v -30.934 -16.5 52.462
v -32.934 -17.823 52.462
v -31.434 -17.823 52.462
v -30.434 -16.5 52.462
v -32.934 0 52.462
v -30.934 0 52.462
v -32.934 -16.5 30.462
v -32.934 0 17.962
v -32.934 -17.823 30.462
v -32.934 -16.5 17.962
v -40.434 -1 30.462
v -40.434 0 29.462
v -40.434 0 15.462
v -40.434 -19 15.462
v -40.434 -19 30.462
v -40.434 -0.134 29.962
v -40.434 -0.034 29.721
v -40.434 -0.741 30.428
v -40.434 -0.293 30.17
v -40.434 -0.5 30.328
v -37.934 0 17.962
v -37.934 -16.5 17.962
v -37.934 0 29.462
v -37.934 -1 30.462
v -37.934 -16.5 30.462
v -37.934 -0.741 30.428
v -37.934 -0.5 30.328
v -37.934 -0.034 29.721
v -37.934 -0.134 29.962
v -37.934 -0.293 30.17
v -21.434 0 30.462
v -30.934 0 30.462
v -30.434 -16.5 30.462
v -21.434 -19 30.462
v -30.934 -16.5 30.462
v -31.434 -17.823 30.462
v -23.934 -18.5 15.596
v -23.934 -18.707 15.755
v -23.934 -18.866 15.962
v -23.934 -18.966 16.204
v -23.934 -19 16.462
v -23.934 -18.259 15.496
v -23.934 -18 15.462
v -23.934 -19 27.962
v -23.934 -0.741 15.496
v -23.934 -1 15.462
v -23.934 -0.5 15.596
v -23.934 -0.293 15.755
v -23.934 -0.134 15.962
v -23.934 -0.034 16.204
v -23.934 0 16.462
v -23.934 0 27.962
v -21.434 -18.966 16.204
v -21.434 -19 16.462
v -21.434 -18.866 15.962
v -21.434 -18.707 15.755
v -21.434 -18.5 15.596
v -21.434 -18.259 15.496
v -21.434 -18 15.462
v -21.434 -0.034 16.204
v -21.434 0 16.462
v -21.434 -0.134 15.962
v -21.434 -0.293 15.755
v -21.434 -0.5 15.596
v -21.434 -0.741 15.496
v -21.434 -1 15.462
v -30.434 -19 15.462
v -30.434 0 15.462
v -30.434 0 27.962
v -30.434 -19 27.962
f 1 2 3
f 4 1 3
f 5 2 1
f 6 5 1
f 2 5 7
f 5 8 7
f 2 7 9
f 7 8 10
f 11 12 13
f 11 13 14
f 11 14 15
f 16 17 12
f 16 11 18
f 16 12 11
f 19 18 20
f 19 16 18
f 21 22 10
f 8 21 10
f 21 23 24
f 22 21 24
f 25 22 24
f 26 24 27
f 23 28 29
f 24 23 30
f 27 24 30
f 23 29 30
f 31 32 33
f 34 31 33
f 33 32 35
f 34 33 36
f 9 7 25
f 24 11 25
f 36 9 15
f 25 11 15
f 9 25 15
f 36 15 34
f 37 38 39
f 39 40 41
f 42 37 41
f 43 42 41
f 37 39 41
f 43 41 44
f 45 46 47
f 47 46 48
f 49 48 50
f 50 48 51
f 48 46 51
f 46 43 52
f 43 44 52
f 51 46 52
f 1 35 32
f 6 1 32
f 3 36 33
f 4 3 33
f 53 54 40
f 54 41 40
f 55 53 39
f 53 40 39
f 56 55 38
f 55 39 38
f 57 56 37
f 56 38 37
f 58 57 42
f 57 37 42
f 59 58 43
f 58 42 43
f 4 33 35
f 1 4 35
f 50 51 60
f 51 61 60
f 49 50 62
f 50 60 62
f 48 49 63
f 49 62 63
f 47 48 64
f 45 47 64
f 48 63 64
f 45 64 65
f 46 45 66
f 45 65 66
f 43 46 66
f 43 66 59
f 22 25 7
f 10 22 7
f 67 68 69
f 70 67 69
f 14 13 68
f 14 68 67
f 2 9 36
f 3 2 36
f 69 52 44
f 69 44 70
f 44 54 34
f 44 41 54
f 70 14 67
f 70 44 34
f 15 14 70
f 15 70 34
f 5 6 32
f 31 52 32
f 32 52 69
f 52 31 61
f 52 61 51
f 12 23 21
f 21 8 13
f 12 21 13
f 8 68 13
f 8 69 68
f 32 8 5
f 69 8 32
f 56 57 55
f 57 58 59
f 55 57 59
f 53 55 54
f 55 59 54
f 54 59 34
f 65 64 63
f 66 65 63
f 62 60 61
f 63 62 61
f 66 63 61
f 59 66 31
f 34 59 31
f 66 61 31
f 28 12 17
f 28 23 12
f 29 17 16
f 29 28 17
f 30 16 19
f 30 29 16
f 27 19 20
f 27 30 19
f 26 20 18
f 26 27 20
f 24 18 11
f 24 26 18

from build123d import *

# Parameters (mm, degrees)
F0_W     = 10
F0_H     = 15
F1_DEPTH = 19
F2_T     = -2.5
F3_DEPTH = 9
F4_T     = -2.5
F5_DEPTH = 25
F6_DEPTH = 25
F8_DEPTH = 22
F9_R     = 1


# Not quite as in the source:
# - two fillets or chamfers of one size are made in one step


with BuildPart() as f1:
    # F0 (on Front) → F1 (new body)
    with BuildSketch(Plane.XZ):
        with Locations((-35.433777729, 22.9624143615)):
            Rectangle(F0_W, F0_H)
    extrude(amount=F1_DEPTH)

    # F2
    f2_openings = [f1.faces().sort_by_distance(p)[0] for p in [
        (-35.433778, 0, 22.962414),
        (-35.433778, -9.5, 30.462414),
    ]]
    offset(amount=F2_T, openings=f2_openings)

    # F3 (add): a face of the model
    f3_faces = [f1.faces().sort_by_distance(p)[0] for p in [
        (-30.433777729, -9.5, 22.9624143615),
    ]]
    extrude(f3_faces, amount=F3_DEPTH)

    # F4: a shell. OpenCascade refuses it in one call, so the cavity is built on its own and cut out:
    # the body offset inwards by the wall thickness, plus a prism from it out through each open face.
    f4_core = offset(f1.part, amount=F4_T, kind=Kind.INTERSECTION, mode=Mode.PRIVATE)
    f4_exits = [f4_core.faces().sort_by_distance(p)[0] for p in [
        (-27.183778, -2.5, 22.962414),
    ]]
    add(f4_core, mode=Mode.SUBTRACT)
    extrude(f4_exits, amount=-F4_T, mode=Mode.SUBTRACT)

    # F5 (cut): a face of the model
    f5_faces = [f1.faces().sort_by_distance(p)[0] for p in [
        (-27.183777729, -16.5, 22.9624143615),
    ]]
    extrude(f5_faces, amount=-F5_DEPTH, mode=Mode.SUBTRACT)

    # F6 (cut): a face of the model
    f6_faces = [f1.faces().sort_by_distance(p)[0] for p in [
        (-27.183777729, -9.5, 17.9624143615),
    ]]
    extrude(f6_faces, amount=-F6_DEPTH, mode=Mode.SUBTRACT)

    # F7 (on face) → F8 (join)
    with BuildSketch(Plane.XY.offset(30.4624143615)):
        Polygon((-30.933777729, 0), (-32.933777729, 0), (-32.933777729, -17.8228756555), (-31.933777729, -17.8228756555), (-31.433777729, -17.8228756555), (-30.433777729, -16.5), (-30.933777729, -16.5), align=None)
    extrude(amount=F8_DEPTH)

    # F9
    f9_edges = [f1.edges().sort_by_distance(p)[0] for p in [
        (-22.683778, 0, 15.462414),
        (-22.683778, -19, 15.462414),
        (-39.183778, 0, 30.462414),
    ]]
    fillet(f9_edges, radius=F9_R)


solid = f1.part
